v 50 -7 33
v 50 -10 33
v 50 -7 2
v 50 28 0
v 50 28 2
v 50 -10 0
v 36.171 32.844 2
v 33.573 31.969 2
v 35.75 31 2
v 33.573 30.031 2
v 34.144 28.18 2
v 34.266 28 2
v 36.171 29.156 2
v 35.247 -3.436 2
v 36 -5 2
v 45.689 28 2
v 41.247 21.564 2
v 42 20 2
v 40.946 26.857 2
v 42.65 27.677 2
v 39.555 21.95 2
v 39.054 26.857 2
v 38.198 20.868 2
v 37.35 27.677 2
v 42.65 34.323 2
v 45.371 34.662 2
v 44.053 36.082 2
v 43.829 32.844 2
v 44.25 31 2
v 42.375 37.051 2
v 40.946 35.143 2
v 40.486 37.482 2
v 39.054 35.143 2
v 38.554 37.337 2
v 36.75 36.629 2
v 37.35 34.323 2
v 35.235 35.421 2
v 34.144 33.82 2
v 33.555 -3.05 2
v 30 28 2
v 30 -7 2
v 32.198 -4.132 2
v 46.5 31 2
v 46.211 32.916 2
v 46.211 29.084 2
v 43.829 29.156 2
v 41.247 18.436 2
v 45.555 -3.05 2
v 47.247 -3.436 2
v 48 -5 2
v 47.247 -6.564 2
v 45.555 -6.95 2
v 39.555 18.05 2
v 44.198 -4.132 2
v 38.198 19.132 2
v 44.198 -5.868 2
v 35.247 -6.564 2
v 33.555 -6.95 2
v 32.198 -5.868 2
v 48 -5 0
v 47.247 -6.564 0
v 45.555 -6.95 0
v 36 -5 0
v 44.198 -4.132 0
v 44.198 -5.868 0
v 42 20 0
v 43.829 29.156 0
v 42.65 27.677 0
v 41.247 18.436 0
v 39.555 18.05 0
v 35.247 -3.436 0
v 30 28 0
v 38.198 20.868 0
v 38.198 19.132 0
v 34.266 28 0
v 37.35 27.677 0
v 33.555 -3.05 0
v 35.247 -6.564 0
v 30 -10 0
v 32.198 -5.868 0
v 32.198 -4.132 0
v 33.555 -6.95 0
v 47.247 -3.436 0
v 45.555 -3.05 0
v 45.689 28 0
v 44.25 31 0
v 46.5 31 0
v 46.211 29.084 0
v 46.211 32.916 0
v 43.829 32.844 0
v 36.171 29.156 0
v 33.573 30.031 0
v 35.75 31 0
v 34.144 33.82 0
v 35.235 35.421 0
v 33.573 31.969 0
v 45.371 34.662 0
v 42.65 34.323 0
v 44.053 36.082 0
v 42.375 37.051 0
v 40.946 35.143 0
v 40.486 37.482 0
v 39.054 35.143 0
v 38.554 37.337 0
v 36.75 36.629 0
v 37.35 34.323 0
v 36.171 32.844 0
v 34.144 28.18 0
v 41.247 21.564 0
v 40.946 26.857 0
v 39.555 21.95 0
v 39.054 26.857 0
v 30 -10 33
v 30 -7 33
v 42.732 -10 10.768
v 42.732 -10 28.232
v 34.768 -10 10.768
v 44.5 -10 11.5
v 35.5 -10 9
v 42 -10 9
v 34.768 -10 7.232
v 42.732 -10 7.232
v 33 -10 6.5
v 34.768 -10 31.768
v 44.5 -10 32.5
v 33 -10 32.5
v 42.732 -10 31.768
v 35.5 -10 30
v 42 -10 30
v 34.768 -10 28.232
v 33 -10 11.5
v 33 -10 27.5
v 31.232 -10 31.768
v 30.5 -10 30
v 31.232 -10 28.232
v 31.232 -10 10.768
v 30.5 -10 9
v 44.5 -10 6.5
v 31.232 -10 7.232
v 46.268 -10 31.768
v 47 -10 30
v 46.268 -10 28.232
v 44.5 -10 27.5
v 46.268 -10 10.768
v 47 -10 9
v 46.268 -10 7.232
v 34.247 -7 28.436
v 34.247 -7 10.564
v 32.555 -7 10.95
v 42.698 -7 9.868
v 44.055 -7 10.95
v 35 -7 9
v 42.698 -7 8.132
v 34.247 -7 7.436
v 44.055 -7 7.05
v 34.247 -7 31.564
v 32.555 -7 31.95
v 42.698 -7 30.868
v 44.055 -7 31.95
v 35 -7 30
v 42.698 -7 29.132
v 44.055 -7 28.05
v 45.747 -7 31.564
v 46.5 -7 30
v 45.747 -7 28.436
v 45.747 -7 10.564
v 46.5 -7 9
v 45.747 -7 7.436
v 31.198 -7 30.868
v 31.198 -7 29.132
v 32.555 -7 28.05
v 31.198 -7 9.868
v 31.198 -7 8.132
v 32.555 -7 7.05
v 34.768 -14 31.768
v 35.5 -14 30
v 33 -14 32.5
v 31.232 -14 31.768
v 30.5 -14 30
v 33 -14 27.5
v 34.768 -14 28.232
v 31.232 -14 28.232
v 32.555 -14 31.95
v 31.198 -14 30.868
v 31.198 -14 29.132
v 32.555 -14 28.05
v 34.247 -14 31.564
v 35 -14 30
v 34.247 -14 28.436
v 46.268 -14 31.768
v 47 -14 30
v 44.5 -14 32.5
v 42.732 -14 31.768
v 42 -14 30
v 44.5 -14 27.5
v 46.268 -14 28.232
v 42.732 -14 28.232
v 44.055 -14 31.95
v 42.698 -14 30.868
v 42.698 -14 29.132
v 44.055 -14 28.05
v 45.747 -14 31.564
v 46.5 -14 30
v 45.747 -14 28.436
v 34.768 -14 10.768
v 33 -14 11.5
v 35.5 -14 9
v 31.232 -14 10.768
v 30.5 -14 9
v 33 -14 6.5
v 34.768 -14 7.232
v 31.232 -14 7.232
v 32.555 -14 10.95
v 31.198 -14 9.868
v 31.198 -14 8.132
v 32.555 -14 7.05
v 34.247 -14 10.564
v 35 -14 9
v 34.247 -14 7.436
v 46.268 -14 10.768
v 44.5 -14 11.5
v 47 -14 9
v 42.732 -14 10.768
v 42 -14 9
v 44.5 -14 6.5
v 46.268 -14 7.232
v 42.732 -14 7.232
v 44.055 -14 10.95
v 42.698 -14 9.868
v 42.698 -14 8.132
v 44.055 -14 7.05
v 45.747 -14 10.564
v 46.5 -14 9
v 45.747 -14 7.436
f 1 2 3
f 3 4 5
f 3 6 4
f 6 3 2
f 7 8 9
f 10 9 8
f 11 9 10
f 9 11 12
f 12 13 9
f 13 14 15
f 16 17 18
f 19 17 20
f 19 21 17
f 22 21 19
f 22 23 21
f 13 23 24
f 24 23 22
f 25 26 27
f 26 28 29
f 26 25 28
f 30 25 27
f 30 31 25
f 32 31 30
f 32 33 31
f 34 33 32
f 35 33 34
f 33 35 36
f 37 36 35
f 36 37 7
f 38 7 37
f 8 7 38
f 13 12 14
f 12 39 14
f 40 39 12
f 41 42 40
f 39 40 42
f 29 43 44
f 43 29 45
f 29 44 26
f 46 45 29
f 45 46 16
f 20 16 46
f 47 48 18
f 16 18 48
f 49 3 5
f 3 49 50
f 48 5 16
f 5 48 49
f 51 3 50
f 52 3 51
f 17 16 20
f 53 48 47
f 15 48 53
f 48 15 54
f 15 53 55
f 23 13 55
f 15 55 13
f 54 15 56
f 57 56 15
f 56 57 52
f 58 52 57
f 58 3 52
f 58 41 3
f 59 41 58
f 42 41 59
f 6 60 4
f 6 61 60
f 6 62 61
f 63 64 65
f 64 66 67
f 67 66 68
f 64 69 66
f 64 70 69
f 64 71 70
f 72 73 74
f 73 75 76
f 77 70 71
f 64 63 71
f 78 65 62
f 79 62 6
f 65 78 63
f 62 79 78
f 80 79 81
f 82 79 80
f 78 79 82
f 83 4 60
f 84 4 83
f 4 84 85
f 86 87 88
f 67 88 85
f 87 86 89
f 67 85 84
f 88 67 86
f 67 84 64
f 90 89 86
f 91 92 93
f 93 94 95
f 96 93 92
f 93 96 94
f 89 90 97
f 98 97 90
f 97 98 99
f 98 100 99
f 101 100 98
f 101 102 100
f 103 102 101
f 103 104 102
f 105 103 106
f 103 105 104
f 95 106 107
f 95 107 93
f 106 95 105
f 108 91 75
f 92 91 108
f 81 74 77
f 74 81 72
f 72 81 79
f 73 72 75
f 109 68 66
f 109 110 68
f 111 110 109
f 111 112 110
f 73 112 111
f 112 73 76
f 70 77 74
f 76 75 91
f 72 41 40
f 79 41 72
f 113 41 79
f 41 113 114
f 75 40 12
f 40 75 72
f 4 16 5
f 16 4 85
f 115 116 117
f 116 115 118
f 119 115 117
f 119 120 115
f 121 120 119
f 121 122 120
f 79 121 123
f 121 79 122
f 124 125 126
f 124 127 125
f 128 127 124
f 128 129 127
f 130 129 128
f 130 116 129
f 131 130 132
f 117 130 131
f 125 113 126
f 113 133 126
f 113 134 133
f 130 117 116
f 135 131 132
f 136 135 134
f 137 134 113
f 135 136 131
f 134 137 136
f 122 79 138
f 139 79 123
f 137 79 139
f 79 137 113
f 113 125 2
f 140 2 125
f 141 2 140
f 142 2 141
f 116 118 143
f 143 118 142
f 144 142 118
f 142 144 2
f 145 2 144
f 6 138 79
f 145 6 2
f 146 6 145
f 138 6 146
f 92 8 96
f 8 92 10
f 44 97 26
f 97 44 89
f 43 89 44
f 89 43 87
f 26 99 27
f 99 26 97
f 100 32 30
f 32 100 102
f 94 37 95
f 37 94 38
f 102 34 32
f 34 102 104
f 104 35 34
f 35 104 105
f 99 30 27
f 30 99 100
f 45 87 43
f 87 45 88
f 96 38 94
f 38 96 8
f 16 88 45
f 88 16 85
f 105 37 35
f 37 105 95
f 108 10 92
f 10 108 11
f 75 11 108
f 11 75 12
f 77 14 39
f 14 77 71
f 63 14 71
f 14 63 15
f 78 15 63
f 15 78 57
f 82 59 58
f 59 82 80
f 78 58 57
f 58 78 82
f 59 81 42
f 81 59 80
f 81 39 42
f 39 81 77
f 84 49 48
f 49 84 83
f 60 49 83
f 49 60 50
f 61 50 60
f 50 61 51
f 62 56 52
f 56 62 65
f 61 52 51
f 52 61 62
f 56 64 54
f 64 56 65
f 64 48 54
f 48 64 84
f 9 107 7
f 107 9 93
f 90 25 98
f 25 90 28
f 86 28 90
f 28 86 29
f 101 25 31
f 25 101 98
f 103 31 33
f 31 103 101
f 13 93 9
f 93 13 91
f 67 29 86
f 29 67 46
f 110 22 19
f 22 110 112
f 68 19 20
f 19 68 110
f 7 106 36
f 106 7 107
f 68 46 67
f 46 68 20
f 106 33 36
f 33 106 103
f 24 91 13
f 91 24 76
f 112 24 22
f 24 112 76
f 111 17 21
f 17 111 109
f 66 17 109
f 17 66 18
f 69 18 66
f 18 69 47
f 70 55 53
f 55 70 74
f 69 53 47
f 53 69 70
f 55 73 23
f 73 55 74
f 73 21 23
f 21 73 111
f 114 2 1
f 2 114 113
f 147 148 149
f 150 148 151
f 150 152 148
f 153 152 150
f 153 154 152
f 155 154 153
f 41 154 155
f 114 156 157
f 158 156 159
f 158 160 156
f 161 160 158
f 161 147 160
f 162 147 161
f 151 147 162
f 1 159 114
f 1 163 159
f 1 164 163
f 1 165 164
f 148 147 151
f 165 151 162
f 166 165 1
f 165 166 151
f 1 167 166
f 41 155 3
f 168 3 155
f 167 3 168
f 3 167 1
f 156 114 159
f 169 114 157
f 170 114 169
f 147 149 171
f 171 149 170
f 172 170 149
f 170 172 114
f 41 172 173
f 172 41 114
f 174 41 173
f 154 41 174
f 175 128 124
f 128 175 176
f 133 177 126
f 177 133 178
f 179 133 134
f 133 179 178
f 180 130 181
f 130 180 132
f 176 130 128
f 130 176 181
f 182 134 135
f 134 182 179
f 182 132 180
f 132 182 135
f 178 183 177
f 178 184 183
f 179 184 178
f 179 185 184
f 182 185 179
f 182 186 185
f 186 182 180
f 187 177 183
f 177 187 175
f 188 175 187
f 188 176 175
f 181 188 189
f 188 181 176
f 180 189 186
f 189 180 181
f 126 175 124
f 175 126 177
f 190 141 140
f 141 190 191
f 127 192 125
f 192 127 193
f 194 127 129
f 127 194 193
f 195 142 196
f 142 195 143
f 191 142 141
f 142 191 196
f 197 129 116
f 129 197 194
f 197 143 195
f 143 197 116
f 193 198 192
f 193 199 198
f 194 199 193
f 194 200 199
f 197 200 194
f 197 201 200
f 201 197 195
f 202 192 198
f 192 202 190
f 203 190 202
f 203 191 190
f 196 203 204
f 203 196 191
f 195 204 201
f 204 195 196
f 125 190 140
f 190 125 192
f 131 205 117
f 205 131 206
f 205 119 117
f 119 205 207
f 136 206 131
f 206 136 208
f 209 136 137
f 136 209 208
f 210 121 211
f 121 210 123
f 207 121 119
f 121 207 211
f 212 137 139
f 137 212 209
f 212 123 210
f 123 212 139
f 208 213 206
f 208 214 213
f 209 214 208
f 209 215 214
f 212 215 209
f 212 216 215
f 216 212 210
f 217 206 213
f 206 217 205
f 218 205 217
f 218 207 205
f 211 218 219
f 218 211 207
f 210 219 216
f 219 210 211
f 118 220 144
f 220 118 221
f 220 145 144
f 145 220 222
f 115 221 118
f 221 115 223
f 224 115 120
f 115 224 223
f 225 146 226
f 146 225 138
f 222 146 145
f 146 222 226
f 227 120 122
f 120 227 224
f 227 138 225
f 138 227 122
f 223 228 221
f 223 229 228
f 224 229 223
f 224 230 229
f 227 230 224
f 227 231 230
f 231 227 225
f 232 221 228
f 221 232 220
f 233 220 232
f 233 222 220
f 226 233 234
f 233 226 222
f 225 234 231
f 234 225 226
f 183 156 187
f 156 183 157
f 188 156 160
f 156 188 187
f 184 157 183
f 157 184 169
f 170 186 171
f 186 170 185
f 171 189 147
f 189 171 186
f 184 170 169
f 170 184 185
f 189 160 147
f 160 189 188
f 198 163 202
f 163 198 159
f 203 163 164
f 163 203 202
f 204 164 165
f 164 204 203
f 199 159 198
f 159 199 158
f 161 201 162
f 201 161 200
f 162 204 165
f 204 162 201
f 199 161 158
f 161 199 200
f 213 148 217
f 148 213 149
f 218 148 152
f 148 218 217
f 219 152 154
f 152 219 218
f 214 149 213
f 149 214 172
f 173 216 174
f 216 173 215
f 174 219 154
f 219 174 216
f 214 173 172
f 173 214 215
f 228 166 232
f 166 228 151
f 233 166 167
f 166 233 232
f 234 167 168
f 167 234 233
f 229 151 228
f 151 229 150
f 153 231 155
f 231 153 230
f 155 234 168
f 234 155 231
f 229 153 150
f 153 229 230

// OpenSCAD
//color("green") import("C:/Users/atlan/Downloads/LaserHand.stl");

difference() {
  union() {
  translate([30,-10,0]) cube([20,38,2]);
  translate([40,31,0]) cylinder(2,6.5,6.5);;
  }

  translate([34,-5,0]) cylinder(6,2,2);
  translate([46,-5,0]) cylinder(6,2,2);
  translate([40,31,0]) cylinder(6,4.25,4.25);
    translate([40,20,0])cylinder(6,2,2);
}
difference() {
union() {
    translate([30,-10,0]) cube([20,3,33]);
    translate([33,-8,30]) rotate([90,0,0])cylinder(6,r=2.5);
translate([44.5,-8,30]) rotate([90,0,0])cylinder(6,r=2.5);
translate([33,-8,9]) rotate([90,0,0])cylinder(6,r=2.5);
translate([44.5,-8,9]) rotate([90,0,0])cylinder(6,r=2.5);
}
translate([33,-5,30]) rotate([90,0,0])cylinder(10,r=2);
translate([44.5,-5,30]) rotate([90,0,0])cylinder(10,r=2);
translate([33,-5,9]) rotate([90,0,0])cylinder(10,r=2);
translate([44.5,-5,9]) rotate([90,0,0])cylinder(10,r=2);
}
